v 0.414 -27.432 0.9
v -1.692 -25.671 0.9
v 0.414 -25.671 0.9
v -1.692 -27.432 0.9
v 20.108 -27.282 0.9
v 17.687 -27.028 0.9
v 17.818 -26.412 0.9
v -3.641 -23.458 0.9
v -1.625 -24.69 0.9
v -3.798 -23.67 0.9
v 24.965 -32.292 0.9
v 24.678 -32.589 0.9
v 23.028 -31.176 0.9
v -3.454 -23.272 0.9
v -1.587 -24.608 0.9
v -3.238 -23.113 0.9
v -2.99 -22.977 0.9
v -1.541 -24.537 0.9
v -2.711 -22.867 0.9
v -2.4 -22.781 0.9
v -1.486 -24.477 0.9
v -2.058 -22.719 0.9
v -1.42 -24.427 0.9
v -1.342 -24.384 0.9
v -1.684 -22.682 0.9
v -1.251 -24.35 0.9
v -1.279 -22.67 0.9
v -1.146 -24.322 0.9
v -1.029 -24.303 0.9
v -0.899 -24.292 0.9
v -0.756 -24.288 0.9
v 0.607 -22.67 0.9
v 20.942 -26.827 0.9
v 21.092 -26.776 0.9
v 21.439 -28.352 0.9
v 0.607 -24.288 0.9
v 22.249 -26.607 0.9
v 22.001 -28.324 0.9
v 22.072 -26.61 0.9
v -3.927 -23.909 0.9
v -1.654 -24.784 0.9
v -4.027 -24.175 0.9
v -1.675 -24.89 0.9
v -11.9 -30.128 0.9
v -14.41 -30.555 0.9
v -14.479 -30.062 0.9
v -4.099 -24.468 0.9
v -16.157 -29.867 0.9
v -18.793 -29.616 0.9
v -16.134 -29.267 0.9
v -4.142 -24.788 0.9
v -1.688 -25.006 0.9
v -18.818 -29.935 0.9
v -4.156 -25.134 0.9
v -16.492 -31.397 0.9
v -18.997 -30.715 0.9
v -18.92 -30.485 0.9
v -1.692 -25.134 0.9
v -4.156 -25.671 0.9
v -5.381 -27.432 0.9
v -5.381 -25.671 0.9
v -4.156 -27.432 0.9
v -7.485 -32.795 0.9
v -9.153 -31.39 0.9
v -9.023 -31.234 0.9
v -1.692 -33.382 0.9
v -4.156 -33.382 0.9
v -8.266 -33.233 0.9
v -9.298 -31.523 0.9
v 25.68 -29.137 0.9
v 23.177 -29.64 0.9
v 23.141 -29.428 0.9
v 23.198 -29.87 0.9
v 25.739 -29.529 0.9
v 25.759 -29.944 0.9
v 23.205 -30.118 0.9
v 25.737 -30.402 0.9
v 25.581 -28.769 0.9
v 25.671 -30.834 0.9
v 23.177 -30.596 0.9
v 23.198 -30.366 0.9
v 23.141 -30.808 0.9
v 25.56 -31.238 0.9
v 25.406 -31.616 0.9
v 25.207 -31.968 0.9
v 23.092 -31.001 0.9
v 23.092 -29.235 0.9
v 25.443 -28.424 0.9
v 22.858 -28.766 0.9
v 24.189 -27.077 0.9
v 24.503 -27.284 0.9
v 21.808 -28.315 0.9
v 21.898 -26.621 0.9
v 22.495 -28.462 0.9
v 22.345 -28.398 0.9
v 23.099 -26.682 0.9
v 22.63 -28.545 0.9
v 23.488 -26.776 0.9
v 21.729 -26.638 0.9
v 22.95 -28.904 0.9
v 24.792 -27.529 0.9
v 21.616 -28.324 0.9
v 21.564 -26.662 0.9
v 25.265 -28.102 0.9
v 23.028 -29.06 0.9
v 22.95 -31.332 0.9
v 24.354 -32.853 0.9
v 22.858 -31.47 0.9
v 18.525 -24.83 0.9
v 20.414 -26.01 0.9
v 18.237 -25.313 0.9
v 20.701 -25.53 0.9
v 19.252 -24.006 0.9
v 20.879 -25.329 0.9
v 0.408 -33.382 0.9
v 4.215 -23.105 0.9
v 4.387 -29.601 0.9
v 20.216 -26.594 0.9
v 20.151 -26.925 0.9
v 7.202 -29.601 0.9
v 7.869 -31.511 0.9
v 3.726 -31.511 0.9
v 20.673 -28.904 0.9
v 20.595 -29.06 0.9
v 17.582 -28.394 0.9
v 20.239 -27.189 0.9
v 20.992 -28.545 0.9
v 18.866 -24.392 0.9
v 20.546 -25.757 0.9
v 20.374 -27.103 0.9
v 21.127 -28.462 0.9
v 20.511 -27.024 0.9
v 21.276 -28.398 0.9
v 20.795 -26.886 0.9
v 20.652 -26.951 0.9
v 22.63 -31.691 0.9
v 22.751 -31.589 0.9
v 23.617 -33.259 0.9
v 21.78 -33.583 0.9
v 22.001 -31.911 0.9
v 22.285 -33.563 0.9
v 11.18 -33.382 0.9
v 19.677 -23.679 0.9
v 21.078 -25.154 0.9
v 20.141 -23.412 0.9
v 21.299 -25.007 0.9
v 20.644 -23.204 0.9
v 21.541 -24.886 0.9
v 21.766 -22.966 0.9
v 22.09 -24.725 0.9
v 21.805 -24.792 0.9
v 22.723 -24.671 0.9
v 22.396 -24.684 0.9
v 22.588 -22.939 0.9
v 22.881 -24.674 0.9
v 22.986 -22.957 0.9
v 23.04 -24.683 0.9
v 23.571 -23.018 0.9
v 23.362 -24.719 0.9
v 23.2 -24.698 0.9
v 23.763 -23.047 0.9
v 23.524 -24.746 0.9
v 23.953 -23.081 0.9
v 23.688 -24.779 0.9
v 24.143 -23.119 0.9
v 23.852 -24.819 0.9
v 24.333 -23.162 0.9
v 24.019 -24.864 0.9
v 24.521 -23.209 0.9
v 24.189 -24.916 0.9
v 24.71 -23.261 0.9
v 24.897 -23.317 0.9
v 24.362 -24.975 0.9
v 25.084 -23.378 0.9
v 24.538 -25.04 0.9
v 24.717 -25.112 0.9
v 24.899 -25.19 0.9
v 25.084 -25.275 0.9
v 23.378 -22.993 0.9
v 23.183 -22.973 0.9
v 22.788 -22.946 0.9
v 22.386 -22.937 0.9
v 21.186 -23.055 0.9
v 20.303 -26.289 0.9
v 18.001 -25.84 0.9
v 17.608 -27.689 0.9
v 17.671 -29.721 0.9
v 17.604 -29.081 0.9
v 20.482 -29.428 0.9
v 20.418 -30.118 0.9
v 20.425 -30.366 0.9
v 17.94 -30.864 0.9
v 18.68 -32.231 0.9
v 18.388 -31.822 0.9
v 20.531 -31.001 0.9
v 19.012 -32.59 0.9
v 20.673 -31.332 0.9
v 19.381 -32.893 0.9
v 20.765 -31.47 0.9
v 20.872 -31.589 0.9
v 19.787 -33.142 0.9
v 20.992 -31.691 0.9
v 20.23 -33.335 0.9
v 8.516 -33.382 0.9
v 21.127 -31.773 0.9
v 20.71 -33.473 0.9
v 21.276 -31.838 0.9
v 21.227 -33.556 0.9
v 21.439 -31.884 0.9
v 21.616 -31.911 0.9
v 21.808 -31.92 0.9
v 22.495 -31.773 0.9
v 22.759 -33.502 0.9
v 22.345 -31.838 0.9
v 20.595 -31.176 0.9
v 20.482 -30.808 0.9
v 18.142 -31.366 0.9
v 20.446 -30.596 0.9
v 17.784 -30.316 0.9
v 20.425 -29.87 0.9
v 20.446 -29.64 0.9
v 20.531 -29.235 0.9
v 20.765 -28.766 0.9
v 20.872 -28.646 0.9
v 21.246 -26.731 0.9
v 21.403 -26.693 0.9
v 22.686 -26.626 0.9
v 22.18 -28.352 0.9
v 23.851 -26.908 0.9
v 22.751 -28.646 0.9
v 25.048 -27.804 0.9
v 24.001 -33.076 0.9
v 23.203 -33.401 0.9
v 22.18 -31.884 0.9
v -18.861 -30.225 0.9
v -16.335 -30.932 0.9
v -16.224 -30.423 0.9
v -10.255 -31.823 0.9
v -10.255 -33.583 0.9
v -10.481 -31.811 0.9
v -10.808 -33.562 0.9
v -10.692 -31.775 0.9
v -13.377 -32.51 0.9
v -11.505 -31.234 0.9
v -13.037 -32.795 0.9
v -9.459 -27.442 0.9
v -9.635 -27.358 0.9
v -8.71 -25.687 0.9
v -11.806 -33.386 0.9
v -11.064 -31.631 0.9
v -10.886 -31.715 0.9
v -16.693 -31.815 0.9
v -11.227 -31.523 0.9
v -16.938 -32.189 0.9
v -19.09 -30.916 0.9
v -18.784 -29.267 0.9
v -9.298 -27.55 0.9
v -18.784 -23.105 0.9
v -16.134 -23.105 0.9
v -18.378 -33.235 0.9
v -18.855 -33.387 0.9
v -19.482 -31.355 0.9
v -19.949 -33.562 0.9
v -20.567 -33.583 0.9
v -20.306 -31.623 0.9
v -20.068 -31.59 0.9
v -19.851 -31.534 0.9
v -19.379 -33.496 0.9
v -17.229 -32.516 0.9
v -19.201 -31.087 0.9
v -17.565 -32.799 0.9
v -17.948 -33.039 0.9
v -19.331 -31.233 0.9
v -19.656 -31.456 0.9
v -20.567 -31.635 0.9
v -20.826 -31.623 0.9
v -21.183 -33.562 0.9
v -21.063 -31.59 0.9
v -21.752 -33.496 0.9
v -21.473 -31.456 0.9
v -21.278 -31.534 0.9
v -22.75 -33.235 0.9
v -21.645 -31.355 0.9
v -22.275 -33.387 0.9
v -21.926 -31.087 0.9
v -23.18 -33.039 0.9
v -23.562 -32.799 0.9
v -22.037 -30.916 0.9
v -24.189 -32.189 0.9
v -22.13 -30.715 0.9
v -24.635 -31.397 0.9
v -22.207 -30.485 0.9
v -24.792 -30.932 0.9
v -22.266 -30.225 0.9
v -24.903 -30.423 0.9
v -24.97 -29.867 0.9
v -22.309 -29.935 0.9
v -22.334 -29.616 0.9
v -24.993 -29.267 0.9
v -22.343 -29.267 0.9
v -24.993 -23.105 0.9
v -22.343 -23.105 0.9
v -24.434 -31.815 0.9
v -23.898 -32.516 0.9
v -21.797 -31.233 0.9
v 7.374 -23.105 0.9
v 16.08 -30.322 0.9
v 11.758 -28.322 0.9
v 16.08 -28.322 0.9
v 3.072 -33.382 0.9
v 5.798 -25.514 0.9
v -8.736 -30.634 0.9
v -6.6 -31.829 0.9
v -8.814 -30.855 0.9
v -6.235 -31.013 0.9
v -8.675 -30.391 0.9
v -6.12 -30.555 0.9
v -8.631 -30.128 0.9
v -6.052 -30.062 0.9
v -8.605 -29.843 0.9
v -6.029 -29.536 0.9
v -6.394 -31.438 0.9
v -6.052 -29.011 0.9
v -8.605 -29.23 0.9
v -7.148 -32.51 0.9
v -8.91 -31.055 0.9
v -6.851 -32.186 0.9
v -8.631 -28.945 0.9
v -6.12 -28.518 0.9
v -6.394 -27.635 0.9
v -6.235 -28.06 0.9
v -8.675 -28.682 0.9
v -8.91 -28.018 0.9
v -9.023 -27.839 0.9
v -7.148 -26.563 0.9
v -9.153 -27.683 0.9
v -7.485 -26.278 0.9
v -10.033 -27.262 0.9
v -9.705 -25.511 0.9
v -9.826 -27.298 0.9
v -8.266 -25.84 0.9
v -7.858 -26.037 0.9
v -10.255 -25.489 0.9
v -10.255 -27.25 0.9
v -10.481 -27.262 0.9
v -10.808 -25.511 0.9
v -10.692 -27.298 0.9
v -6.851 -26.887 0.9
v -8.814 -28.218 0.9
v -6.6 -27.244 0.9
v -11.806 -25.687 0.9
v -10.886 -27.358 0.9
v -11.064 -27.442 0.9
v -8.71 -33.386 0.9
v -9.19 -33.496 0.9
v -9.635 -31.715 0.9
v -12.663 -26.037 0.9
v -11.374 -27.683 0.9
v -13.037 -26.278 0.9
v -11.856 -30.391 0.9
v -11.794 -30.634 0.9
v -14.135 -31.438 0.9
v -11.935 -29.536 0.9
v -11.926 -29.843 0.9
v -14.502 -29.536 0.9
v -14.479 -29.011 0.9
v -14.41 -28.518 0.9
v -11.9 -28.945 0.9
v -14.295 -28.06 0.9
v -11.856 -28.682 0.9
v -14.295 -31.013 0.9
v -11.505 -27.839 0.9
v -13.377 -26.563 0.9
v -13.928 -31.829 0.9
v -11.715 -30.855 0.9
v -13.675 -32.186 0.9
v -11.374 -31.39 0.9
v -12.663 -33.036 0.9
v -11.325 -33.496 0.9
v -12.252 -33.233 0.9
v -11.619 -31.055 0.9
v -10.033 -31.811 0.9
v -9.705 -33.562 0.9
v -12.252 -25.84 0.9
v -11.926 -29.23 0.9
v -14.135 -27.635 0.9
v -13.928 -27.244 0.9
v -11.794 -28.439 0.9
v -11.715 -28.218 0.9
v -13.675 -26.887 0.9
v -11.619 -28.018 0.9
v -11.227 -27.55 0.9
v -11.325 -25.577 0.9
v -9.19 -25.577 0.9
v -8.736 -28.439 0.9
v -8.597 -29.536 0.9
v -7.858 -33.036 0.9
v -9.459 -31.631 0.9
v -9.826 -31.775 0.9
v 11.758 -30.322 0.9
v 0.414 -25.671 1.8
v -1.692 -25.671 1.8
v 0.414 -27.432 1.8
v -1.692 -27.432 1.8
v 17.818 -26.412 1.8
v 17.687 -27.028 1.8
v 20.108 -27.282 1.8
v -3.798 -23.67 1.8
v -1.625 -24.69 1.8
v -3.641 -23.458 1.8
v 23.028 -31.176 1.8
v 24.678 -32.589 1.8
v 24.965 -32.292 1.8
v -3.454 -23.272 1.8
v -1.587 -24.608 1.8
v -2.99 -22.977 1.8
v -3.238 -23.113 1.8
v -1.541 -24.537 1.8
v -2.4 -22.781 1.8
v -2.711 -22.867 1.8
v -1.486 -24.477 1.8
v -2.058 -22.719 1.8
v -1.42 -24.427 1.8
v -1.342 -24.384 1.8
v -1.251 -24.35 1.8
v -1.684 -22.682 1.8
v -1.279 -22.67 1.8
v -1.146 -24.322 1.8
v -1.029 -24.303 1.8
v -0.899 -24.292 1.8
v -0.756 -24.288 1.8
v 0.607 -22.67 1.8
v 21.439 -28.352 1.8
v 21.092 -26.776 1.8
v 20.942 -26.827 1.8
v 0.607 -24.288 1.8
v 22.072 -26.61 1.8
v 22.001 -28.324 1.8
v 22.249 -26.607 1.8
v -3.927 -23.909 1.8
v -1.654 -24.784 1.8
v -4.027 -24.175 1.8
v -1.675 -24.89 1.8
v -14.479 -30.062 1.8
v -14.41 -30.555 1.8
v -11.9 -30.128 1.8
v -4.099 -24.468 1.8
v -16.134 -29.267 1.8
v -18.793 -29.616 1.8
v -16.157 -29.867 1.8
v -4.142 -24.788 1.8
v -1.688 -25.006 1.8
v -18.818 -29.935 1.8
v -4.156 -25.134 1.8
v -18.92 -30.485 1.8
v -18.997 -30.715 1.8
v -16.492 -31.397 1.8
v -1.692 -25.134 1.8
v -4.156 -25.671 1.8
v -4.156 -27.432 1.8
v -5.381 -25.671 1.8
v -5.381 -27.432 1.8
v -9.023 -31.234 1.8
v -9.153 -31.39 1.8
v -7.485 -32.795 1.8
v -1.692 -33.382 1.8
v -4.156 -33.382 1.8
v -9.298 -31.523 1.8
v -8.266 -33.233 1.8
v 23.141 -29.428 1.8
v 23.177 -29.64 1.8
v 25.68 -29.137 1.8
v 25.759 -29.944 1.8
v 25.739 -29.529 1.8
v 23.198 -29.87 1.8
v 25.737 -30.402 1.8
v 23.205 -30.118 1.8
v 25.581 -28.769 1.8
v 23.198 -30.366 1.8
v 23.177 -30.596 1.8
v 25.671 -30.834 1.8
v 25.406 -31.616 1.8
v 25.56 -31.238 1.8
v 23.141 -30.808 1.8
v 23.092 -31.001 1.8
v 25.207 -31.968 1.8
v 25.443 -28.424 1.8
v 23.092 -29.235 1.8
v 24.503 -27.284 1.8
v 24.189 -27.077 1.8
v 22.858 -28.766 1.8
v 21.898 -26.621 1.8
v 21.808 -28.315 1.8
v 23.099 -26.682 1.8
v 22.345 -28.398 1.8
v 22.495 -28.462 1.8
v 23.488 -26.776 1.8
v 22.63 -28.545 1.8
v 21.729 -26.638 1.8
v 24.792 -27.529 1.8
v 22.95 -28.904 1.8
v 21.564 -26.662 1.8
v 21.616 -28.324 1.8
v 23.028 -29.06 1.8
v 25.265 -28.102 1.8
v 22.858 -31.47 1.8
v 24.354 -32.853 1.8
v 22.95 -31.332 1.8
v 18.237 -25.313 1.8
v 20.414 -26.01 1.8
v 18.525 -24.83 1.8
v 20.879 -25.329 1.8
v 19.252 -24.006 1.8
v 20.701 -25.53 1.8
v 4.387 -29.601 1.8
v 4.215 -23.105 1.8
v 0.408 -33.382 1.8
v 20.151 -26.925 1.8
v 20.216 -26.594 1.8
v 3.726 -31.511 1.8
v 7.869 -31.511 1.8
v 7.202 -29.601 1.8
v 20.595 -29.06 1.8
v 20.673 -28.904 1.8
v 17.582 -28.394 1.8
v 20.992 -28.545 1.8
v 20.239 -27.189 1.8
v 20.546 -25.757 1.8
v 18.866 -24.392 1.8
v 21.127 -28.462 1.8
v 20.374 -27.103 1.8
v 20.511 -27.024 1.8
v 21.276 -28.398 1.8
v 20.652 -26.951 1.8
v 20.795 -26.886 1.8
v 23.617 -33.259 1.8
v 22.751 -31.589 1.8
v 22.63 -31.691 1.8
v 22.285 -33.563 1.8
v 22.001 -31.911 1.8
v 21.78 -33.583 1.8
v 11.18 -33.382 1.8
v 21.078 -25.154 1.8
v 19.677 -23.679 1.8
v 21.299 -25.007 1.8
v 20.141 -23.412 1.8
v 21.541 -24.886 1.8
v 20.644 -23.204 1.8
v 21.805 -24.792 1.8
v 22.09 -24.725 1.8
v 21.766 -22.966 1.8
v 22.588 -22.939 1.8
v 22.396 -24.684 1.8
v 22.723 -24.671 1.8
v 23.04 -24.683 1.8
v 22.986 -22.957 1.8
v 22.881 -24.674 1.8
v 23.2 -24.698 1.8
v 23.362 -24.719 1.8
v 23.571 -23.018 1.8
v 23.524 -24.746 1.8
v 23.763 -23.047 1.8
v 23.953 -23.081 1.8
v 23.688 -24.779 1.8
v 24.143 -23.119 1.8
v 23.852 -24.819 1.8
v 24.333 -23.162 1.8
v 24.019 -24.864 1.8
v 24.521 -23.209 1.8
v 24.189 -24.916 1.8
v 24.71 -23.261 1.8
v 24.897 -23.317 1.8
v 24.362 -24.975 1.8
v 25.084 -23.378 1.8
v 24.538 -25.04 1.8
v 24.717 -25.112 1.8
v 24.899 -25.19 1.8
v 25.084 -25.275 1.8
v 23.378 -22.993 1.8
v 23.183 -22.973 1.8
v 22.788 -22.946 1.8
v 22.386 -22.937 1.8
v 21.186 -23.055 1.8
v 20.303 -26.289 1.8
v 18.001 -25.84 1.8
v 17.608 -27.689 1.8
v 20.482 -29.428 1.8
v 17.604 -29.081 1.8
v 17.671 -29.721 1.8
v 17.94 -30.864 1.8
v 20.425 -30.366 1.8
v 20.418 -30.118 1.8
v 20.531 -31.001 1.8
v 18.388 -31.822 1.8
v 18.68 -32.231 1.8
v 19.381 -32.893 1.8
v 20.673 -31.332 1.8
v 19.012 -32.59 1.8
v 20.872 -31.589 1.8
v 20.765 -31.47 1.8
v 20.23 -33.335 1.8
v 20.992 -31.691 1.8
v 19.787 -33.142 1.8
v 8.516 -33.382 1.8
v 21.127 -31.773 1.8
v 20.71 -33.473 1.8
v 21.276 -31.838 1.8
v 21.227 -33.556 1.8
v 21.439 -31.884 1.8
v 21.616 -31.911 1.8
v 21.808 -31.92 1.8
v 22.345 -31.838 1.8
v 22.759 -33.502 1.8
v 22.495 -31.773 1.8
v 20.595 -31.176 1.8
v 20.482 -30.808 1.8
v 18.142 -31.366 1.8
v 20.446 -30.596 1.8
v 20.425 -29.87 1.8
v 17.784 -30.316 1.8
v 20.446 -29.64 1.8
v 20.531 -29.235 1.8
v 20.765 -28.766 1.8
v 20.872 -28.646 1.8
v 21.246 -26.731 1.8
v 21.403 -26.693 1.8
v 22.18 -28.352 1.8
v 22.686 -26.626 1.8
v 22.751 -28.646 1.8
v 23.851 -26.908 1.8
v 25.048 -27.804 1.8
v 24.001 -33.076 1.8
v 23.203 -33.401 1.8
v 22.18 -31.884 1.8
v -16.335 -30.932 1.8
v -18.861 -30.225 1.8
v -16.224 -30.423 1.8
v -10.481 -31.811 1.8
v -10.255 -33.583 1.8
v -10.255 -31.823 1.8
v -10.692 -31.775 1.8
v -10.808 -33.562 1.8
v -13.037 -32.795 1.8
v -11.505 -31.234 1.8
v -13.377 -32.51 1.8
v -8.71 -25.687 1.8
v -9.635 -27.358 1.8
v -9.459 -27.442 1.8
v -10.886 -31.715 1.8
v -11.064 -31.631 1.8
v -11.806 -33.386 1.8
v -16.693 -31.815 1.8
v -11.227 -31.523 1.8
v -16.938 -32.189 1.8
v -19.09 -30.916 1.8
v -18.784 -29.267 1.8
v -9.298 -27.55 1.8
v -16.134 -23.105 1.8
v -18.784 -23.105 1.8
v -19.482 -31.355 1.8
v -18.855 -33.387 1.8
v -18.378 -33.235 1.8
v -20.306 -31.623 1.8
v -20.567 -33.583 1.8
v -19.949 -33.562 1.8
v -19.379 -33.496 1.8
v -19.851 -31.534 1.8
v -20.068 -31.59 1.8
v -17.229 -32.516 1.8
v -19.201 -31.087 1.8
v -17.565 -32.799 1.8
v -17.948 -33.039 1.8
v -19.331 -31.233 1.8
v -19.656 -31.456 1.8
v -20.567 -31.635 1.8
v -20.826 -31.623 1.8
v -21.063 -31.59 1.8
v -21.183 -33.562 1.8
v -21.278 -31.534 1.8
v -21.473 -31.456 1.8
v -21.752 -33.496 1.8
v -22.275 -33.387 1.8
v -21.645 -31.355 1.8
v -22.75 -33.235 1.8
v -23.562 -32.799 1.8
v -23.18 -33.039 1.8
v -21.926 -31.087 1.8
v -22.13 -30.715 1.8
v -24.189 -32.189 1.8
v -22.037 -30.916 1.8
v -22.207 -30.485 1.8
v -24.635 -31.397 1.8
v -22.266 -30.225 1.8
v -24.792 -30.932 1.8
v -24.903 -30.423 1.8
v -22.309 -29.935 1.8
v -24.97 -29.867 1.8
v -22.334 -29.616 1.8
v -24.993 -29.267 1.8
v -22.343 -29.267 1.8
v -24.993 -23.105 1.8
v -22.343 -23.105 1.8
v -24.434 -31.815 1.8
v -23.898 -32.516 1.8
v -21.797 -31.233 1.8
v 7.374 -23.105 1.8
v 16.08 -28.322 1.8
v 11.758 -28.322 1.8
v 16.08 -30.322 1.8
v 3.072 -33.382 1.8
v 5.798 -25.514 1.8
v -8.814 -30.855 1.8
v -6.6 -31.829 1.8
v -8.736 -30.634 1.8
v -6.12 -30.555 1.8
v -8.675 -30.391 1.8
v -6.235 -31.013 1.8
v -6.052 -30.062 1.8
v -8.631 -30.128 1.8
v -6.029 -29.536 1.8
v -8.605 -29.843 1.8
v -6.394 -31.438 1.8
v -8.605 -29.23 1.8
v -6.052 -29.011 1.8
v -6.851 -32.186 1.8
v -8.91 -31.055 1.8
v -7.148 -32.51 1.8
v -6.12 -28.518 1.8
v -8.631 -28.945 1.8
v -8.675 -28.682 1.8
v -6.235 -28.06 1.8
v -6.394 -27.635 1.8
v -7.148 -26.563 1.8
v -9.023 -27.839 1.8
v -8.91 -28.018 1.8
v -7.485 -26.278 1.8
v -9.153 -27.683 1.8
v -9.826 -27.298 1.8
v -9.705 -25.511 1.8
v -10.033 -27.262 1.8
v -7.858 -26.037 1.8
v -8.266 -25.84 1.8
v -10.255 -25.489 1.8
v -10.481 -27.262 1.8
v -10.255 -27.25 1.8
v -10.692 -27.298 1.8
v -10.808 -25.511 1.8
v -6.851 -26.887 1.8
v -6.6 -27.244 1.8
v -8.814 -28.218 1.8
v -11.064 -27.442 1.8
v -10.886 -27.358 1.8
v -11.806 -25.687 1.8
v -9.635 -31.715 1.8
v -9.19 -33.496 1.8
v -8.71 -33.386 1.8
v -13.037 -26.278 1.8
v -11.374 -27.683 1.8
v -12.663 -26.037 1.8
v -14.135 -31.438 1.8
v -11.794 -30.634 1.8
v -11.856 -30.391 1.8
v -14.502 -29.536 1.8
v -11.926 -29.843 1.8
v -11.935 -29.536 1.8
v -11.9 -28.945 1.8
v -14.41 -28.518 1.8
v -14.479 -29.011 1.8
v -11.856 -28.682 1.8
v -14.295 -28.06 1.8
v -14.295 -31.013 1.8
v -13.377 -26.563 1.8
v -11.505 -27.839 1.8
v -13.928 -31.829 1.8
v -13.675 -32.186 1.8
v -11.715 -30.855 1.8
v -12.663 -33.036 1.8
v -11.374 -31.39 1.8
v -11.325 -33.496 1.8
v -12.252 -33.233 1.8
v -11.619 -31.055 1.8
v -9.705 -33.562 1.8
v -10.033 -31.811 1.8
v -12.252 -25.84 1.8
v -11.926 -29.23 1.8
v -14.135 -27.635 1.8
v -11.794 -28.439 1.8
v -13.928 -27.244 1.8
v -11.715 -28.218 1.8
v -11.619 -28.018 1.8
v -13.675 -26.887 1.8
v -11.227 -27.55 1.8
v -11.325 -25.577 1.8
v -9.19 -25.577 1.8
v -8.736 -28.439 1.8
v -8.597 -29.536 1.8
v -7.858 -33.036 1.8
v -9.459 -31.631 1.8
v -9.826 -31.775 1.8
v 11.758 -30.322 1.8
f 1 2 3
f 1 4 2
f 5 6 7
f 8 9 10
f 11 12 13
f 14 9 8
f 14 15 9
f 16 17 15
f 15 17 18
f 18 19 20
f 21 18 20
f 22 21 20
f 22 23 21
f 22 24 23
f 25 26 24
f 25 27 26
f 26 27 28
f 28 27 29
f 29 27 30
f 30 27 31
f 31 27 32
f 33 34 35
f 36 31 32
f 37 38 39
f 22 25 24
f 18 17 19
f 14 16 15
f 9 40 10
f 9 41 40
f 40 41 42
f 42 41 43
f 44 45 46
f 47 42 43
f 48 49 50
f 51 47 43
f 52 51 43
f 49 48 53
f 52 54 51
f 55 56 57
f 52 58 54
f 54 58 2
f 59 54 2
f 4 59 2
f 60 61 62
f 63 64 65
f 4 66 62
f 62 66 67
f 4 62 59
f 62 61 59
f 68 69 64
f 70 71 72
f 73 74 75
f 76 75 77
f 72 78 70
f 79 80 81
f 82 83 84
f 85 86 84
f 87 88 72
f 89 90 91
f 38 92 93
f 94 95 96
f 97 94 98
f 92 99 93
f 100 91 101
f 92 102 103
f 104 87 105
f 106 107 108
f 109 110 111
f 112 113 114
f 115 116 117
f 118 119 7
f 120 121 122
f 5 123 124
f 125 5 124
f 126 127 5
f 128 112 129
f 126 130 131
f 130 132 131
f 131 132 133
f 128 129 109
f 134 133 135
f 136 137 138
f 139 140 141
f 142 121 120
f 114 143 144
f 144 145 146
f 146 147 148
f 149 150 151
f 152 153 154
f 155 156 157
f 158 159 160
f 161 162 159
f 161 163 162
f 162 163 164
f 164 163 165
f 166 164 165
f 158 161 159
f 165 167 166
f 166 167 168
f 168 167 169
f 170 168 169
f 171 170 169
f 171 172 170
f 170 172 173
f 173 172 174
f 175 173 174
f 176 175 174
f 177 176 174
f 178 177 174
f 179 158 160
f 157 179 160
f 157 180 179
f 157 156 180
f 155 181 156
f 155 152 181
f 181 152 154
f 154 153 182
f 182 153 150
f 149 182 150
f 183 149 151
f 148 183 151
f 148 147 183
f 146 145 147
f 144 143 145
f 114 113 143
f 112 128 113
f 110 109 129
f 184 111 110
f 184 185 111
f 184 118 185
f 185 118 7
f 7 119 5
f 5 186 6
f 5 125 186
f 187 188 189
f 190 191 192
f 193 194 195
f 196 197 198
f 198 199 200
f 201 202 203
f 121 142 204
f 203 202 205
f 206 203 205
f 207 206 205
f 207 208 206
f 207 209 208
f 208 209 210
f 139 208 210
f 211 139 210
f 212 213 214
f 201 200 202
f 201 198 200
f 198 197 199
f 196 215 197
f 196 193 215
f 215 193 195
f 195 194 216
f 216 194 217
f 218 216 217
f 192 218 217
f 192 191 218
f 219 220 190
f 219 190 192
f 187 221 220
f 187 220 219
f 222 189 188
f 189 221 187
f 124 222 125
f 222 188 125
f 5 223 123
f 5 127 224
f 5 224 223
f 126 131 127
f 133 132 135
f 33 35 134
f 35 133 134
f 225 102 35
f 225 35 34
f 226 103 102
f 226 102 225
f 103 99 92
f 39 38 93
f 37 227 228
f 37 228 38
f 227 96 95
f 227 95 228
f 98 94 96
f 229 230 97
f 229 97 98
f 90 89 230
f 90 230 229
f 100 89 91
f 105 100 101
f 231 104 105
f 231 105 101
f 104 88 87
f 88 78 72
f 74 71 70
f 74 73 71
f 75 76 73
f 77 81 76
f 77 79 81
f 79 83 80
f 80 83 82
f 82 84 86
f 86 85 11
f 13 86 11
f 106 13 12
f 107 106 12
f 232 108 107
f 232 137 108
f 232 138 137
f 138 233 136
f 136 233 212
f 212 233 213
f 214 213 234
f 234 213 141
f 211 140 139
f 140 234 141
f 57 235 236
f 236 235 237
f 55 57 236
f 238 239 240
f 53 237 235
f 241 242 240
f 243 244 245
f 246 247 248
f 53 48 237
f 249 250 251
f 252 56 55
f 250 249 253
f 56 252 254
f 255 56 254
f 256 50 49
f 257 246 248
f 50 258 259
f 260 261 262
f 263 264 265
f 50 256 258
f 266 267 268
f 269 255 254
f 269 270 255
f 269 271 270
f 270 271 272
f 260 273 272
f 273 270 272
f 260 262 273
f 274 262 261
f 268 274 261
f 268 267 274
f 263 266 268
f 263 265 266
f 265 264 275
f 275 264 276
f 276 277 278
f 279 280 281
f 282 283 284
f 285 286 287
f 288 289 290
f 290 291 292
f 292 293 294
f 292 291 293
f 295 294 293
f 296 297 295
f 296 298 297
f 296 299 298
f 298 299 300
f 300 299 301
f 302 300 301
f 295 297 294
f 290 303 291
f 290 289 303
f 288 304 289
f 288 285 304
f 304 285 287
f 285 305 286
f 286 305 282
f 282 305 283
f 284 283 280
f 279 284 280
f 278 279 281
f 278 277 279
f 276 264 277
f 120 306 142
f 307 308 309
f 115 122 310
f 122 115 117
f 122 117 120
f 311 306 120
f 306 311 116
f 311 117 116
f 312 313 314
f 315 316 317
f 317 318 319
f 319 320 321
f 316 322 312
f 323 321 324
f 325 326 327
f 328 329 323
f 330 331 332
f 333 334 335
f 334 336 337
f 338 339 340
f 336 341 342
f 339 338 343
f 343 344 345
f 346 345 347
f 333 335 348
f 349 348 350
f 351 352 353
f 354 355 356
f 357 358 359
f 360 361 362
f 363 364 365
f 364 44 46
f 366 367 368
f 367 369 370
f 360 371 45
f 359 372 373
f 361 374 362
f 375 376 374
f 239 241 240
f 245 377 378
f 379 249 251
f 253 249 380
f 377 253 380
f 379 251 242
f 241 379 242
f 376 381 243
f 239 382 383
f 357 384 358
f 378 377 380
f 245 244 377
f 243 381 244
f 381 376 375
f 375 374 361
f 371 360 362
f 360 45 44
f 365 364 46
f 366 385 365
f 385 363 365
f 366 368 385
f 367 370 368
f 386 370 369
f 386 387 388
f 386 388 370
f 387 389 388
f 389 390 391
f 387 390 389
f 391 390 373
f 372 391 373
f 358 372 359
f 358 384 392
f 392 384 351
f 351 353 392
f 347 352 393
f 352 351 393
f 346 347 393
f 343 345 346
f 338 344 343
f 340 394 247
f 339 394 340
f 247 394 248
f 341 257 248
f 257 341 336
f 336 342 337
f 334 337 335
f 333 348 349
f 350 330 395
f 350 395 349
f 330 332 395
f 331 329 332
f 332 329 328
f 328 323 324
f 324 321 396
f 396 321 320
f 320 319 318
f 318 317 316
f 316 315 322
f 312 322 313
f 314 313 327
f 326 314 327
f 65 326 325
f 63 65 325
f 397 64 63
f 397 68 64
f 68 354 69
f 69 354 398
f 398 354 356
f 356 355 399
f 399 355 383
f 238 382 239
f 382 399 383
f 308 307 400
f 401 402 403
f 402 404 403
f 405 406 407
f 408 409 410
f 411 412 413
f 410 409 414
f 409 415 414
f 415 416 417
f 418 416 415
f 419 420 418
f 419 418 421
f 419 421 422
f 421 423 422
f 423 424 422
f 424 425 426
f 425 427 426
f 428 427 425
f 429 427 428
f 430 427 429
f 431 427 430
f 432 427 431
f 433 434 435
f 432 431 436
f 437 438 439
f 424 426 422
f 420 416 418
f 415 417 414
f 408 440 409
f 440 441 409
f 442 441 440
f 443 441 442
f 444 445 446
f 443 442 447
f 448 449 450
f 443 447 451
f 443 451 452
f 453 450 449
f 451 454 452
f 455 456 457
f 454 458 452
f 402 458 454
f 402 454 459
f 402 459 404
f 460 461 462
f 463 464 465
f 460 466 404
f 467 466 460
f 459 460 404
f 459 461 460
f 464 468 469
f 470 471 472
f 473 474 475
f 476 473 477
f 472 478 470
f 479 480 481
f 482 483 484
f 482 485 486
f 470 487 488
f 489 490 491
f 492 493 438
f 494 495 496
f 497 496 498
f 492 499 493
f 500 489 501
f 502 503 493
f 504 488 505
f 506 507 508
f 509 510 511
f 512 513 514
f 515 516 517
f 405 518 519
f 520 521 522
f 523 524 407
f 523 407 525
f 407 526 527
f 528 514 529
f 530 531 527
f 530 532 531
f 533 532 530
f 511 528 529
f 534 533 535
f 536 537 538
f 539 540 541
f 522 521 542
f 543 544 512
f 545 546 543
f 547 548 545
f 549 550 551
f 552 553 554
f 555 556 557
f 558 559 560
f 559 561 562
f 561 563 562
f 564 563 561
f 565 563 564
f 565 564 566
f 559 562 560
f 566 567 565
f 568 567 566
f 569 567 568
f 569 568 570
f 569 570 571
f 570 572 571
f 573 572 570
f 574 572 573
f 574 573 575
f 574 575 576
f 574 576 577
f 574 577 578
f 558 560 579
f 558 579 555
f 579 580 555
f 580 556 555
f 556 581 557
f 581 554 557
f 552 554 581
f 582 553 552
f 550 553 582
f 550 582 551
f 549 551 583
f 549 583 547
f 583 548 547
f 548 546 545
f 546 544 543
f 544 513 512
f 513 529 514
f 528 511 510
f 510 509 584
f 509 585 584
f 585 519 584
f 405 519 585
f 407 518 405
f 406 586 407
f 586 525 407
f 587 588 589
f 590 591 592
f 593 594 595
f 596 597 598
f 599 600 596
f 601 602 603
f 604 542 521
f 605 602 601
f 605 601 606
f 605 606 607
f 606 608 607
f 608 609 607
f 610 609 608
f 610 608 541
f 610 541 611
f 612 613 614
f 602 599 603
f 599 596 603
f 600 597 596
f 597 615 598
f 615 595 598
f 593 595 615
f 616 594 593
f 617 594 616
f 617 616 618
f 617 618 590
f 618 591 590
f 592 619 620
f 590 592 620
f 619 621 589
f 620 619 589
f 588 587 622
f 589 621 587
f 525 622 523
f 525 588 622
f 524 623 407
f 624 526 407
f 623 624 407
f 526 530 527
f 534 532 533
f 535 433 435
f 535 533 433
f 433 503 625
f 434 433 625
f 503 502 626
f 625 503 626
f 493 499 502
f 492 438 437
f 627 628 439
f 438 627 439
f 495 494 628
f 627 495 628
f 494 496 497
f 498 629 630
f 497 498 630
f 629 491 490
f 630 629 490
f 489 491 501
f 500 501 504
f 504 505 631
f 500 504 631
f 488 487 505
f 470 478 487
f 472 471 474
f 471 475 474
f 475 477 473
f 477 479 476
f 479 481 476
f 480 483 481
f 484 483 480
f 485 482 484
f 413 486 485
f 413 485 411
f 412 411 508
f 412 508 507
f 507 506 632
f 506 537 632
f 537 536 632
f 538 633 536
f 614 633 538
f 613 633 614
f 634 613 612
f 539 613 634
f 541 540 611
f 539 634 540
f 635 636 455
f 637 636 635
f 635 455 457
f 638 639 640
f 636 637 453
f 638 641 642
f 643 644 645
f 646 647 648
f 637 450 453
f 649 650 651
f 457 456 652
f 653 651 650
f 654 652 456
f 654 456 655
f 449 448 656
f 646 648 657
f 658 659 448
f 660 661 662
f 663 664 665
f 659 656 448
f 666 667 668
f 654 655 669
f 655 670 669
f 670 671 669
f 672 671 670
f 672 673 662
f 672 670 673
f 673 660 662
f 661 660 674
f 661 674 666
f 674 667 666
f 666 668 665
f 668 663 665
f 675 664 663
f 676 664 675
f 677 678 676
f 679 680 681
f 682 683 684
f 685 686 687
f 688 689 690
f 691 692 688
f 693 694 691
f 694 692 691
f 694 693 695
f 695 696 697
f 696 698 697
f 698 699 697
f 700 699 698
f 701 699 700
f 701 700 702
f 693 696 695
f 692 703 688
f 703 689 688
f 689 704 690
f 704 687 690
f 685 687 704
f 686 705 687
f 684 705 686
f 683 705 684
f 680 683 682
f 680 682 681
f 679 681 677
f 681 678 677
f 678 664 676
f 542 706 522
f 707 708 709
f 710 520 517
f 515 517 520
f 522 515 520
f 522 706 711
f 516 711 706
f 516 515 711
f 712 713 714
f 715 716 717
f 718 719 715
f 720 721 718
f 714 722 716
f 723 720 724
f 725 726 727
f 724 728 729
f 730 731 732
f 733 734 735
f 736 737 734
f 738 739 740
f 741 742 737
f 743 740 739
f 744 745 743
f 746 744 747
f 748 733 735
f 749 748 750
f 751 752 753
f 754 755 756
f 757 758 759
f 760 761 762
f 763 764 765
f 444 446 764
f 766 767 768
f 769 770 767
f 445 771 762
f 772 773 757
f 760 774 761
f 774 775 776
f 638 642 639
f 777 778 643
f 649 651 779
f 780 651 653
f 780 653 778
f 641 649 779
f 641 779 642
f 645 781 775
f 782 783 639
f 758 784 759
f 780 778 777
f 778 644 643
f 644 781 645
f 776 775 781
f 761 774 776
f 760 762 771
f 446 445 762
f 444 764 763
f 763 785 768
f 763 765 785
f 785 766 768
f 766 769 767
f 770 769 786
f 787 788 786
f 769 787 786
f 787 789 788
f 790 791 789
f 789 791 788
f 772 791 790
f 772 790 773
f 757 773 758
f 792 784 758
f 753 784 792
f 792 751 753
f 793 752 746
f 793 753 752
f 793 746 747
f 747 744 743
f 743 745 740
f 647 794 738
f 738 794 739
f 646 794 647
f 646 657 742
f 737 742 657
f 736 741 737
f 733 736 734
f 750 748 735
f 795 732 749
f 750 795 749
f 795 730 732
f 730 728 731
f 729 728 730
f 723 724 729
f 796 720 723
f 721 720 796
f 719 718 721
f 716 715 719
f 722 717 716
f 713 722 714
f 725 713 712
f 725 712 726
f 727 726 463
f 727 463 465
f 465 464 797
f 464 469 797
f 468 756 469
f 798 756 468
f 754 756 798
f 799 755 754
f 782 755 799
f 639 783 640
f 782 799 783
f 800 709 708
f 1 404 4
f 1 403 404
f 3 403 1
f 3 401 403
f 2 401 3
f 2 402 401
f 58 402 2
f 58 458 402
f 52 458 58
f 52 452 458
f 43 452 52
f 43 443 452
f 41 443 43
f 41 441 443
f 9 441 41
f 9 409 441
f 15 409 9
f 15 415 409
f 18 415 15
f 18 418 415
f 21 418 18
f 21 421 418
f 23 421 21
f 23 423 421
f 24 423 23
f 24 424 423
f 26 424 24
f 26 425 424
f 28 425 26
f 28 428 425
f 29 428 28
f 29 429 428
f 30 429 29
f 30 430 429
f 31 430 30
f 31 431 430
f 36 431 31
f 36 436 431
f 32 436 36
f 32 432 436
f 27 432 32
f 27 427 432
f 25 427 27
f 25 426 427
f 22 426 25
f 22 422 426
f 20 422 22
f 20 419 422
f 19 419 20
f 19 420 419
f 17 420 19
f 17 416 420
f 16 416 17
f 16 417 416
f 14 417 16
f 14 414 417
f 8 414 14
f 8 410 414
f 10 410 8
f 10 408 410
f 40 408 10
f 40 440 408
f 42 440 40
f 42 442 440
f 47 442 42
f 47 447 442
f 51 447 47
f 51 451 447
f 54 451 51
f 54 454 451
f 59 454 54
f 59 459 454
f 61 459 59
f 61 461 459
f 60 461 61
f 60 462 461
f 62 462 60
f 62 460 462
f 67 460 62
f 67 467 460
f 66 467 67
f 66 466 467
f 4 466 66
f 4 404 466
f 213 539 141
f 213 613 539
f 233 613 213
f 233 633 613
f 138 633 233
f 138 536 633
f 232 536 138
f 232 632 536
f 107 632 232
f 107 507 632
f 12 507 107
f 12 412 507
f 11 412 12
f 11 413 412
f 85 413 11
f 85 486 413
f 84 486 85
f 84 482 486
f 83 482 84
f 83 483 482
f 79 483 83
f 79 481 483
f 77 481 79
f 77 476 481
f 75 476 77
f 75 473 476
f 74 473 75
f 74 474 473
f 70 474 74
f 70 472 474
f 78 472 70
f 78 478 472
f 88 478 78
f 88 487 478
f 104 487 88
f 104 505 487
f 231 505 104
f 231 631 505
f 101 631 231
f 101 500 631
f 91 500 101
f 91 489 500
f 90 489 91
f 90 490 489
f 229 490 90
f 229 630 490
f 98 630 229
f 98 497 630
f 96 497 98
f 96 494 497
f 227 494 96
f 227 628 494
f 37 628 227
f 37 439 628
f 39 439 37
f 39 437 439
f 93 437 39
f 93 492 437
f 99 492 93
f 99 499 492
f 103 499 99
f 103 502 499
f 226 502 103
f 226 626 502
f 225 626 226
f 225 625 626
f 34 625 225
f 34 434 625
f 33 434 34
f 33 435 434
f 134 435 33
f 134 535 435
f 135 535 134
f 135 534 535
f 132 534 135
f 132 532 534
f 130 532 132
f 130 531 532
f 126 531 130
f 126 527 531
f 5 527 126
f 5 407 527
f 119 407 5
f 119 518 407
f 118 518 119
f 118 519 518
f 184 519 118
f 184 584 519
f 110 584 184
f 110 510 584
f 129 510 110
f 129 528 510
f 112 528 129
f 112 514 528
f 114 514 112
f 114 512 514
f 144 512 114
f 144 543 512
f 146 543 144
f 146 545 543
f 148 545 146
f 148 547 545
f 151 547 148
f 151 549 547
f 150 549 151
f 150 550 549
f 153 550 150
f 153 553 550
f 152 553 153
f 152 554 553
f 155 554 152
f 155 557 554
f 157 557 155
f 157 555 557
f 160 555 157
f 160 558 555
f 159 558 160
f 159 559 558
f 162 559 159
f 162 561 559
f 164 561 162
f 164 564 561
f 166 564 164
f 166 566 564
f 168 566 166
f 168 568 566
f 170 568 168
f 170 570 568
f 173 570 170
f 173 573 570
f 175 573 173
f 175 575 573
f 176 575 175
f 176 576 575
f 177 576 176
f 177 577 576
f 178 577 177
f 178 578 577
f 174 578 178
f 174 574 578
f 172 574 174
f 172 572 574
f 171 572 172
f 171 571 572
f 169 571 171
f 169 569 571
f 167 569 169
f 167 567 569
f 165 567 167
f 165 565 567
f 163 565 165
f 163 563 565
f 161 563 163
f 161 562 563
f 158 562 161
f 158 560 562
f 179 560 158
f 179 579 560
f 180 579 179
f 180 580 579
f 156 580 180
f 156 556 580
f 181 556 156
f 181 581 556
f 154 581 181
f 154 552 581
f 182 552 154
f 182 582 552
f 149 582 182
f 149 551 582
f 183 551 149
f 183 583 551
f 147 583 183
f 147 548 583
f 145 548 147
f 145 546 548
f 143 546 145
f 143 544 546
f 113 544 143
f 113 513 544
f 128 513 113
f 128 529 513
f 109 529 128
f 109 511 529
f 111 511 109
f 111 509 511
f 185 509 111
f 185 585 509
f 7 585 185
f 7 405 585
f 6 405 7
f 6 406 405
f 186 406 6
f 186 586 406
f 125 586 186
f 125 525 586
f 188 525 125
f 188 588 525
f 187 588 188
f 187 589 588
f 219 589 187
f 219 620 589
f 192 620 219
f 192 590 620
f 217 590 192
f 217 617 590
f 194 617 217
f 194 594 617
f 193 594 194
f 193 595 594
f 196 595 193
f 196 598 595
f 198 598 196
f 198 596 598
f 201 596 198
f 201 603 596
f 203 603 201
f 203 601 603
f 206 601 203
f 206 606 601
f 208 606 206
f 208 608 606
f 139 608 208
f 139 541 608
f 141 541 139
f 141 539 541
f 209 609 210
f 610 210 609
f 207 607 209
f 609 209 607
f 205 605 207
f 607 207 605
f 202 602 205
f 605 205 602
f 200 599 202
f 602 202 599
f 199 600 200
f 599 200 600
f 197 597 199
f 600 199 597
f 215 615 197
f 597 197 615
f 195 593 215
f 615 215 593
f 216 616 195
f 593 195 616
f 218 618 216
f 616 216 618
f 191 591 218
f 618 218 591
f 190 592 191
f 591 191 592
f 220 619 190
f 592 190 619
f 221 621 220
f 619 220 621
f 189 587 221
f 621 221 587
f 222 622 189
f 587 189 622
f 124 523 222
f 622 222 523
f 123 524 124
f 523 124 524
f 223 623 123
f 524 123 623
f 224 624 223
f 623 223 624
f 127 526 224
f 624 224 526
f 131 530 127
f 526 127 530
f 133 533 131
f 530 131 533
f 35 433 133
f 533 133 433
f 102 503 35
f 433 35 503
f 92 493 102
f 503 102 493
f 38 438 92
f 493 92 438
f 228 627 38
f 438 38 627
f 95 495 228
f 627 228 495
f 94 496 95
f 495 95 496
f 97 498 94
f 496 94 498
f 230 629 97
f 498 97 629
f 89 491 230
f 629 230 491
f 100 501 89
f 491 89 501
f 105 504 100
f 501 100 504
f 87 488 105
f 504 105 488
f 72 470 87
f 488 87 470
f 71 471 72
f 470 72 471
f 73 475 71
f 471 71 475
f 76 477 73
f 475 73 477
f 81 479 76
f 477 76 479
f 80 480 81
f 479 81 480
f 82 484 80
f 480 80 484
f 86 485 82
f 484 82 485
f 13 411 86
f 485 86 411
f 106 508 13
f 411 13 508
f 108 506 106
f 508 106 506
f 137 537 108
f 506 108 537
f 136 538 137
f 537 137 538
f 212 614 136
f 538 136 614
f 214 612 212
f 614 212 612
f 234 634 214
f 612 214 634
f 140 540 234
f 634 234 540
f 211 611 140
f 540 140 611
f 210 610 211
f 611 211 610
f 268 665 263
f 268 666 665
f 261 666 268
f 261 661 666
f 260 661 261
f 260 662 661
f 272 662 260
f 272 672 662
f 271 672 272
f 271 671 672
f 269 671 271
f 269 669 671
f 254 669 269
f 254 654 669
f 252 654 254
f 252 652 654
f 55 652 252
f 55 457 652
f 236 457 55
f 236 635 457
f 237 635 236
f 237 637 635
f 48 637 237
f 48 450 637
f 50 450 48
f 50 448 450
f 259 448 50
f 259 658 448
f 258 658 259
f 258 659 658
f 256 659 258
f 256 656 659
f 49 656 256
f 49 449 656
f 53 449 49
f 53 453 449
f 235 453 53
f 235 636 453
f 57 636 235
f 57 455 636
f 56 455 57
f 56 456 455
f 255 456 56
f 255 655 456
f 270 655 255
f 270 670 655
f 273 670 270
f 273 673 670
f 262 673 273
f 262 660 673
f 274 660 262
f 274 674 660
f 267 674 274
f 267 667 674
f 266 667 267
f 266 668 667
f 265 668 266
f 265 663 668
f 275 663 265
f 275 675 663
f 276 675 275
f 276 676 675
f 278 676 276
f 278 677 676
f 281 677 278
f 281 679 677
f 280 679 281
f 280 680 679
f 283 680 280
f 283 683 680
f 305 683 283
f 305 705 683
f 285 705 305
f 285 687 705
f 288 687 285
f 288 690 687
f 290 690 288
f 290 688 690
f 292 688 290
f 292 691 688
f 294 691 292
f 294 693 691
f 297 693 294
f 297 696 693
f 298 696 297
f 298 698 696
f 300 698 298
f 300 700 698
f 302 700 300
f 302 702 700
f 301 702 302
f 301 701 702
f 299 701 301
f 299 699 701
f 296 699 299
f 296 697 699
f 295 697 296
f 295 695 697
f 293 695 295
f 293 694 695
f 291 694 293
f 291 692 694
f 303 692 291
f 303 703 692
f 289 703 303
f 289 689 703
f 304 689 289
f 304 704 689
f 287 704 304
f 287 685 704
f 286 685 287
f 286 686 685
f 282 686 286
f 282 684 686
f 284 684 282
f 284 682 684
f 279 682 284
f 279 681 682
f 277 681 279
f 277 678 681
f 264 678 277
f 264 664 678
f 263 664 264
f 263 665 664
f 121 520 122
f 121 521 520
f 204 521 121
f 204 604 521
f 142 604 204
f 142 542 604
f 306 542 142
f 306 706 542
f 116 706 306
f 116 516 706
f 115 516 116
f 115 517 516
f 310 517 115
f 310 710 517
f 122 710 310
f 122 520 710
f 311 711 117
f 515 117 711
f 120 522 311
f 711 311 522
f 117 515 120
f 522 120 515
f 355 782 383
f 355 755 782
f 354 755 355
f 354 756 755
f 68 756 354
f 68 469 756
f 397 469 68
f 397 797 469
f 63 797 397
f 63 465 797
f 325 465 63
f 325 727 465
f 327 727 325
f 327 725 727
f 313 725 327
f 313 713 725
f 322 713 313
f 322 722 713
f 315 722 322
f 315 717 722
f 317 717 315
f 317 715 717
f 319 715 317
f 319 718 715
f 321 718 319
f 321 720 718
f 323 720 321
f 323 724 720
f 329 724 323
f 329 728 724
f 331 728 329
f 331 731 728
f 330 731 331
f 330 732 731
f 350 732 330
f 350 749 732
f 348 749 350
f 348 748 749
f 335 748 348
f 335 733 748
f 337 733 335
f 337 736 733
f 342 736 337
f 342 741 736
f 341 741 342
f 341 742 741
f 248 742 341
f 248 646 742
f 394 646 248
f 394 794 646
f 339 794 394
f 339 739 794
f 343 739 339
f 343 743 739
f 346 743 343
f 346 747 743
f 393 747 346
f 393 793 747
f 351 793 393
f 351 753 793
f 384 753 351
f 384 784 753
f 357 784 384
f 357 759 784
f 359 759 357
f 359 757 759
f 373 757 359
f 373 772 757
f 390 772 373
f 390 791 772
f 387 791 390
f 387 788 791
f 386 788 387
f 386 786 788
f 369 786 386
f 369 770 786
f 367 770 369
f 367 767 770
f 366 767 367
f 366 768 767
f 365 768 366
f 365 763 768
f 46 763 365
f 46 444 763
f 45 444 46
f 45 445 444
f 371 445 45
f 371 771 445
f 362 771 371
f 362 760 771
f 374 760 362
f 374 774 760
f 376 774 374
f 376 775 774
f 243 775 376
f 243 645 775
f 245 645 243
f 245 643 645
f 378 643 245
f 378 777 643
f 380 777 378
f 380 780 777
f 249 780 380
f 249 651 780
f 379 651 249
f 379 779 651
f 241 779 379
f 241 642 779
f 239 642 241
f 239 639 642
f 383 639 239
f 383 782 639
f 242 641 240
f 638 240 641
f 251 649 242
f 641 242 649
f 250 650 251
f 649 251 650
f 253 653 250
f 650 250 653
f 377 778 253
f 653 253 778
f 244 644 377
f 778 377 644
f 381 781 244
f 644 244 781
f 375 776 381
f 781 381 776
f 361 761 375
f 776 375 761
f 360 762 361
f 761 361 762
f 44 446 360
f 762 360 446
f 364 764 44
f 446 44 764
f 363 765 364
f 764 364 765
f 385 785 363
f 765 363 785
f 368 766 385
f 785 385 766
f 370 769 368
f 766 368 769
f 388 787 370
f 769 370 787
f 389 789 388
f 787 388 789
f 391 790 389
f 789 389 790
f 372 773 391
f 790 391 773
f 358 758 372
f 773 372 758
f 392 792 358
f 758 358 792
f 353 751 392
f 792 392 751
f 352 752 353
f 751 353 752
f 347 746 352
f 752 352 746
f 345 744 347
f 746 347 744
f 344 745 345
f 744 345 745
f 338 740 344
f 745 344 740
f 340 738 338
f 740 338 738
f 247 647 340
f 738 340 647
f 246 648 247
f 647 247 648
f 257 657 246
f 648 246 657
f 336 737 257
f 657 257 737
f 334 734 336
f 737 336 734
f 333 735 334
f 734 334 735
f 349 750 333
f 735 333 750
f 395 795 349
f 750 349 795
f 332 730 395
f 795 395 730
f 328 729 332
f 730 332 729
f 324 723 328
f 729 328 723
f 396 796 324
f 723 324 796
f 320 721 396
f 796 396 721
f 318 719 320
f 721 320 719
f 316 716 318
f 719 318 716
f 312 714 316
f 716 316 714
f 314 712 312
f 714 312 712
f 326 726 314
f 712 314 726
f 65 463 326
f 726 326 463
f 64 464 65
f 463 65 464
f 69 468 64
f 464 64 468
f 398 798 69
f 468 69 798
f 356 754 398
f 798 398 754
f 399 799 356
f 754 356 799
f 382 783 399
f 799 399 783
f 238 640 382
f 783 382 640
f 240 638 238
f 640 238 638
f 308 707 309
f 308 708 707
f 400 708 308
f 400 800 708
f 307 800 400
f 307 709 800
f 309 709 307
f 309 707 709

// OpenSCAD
$fn = 48;
  // English (below bottom hole)
  translate([0, -28.250, 0.900]) linear_extrude(height=0.900) text("UofA-6", size=10.150, halign="center", valign="center", font="Helvetica Neue:style=Bold");
